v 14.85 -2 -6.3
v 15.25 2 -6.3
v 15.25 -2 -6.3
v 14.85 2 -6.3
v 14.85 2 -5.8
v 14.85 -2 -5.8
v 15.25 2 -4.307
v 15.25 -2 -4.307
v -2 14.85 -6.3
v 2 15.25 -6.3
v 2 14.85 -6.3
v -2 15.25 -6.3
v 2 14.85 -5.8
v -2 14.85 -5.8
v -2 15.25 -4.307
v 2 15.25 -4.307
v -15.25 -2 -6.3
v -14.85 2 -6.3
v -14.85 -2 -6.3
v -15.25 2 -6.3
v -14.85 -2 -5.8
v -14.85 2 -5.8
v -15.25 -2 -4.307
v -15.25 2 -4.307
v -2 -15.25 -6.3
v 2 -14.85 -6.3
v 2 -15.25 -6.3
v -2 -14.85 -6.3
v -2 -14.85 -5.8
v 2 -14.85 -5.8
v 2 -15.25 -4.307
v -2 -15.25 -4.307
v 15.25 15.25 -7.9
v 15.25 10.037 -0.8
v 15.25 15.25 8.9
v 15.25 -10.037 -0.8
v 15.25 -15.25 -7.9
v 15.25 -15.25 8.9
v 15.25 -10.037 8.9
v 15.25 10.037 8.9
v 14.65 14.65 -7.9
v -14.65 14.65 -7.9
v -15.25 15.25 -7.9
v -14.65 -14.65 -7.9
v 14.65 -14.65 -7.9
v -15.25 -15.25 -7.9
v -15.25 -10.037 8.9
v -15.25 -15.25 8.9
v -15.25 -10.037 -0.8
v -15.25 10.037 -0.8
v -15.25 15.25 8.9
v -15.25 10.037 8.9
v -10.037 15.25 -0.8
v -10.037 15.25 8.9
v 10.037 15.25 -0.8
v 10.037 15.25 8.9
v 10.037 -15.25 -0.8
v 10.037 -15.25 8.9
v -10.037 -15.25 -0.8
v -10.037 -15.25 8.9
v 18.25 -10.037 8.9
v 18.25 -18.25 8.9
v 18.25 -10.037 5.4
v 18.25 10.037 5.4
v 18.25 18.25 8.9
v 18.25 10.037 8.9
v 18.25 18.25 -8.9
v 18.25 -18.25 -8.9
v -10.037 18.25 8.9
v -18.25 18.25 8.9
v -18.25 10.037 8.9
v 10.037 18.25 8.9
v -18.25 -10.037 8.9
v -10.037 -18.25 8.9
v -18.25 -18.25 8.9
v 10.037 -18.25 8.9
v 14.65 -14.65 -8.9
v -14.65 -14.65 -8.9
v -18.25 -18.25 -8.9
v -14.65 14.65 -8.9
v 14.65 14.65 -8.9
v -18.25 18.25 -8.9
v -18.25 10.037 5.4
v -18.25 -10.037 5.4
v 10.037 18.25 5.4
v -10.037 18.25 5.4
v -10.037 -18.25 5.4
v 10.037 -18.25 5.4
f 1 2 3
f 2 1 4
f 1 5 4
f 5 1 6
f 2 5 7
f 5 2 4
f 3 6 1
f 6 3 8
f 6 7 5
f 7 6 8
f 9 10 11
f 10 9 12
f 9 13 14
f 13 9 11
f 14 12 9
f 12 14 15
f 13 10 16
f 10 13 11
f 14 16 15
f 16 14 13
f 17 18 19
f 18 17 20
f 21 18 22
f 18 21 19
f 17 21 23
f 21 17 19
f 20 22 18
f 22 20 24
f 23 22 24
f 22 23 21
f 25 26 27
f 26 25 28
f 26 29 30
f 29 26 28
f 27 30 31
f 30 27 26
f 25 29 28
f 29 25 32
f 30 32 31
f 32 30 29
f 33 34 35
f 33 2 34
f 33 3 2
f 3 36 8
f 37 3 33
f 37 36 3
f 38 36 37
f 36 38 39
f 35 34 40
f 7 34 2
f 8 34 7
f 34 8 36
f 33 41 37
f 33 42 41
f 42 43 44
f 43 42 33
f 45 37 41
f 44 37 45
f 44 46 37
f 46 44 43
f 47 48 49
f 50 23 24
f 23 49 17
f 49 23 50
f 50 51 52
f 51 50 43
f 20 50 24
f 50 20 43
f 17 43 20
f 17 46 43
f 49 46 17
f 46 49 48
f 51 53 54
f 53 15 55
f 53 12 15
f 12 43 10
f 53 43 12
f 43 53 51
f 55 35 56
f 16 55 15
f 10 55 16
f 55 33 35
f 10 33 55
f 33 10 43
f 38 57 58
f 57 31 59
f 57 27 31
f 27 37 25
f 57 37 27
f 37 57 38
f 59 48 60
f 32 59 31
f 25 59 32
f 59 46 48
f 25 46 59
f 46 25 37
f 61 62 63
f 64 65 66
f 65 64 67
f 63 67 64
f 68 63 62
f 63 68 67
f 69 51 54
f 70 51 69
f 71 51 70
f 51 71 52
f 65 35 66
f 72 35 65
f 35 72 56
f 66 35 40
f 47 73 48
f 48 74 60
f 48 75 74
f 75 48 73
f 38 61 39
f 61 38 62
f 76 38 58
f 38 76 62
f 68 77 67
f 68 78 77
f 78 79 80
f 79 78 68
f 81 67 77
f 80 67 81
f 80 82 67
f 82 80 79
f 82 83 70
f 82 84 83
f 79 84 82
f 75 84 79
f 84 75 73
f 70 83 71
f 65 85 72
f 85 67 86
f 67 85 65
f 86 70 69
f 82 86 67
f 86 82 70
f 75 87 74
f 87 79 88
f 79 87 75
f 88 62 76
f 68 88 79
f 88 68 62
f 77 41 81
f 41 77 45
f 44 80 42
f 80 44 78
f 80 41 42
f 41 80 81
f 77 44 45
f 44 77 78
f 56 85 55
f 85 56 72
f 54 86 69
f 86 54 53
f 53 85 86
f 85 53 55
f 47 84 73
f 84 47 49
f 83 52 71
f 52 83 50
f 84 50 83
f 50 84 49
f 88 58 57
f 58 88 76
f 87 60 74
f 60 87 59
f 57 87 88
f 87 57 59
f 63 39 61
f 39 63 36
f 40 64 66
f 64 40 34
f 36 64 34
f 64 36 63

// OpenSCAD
deviceFudge=0.5;//mm, fudge factor to account for printing inaccuracy, shrinkage
PCBThickness=1.6; //mm
pinRecepticalTop=5.5;//mm above pcb that the pin receptical extends
pinsHeight=pinRecepticalTop+4.2+2;//mm above pcb, fully extended
maxSubstrateThickness=3;//mm
wallT=3;//mm, wall thickness
PCBShelfW=0.6;//mm, the pcb sits on this
belowPBC=1;//mm extension below PCB
crownFraction=0.55;//fraction of each side length to subtract to make extension corners

capT = 5; //mm cap thickness

solidHeight=pinsHeight;//mm above pcb for solid wall
crownHeight=maxSubstrateThickness+0.5;//mm, corners extension above pin ends
totalHeight=belowPBC+PCBThickness+solidHeight+crownHeight;

module base ( xyDev ) {
    vDeviceDim=xyDev+deviceFudge;
    xyLen=vDeviceDim+wallT*2;
    
    chunk_width = 4;
    chunk_outdent = 0.4;
    chunk_height = 0.5;
    chunk_angle = 75; 
    
    difference(){
        cube([xyLen,xyLen,totalHeight],center = true);
        difference(){
            translate([0,0,belowPBC]) cube([vDeviceDim,vDeviceDim,totalHeight],center = true);
            
            //these parts clip in the PCB
            rotate([0,0,0])   translate([vDeviceDim/2-chunk_outdent,-chunk_width/2,-totalHeight/2+belowPBC+PCBThickness]) {cube([wallT+chunk_outdent,chunk_width,chunk_height],center = false); translate([wallT+chunk_outdent,chunk_width,chunk_height]) rotate([0,0,180]) linear_extrude((wallT+chunk_outdent)*tan(chunk_angle), scale=[0,1]) square([wallT+chunk_outdent,chunk_width]);}
            rotate([0,0,90])  translate([vDeviceDim/2-chunk_outdent,-chunk_width/2,-totalHeight/2+belowPBC+PCBThickness]) {cube([wallT+chunk_outdent,chunk_width,chunk_height],center = false); translate([wallT+chunk_outdent,chunk_width,chunk_height]) rotate([0,0,180]) linear_extrude((wallT+chunk_outdent)*tan(chunk_angle), scale=[0,1]) square([wallT+chunk_outdent,chunk_width]);}
            rotate([0,0,180]) translate([vDeviceDim/2-chunk_outdent,-chunk_width/2,-totalHeight/2+belowPBC+PCBThickness]) {cube([wallT+chunk_outdent,chunk_width,chunk_height],center = false); translate([wallT+chunk_outdent,chunk_width,chunk_height]) rotate([0,0,180]) linear_extrude((wallT+chunk_outdent)*tan(chunk_angle), scale=[0,1]) square([wallT+chunk_outdent,chunk_width]);}
            rotate([0,0,270]) translate([vDeviceDim/2-chunk_outdent,-chunk_width/2,-totalHeight/2+belowPBC+PCBThickness]) {cube([wallT+chunk_outdent,chunk_width,chunk_height],center = false); translate([wallT+chunk_outdent,chunk_width,chunk_height]) rotate([0,0,180]) linear_extrude((wallT+chunk_outdent)*tan(chunk_angle), scale=[0,1]) square([wallT+chunk_outdent,chunk_width]);}
            
        }
        cube([vDeviceDim-2*PCBShelfW,vDeviceDim-2*PCBShelfW,totalHeight+1],center = true);
        
        translate([0,xyLen/2,totalHeight/2+(crownHeight+1)/2-crownHeight]) cube([xyLen*crownFraction,xyLen,crownHeight+1],center = true);
        rotate([0,0,180]) translate([-xyLen*crownFraction/2,-xyLen/2,totalHeight/2-crownHeight]) rotate([0,90,0])  linear_extrude(height=xyLen*crownFraction) polygon([[0,0],[0,wallT],[(pinsHeight-pinRecepticalTop),wallT]]);
        
        rotate([0,0,90]) translate([0,xyLen/2,totalHeight/2+(crownHeight+1)/2-crownHeight]) cube([xyLen*crownFraction,xyLen,crownHeight+1],center = true);
        rotate([0,0,270]) translate([-xyLen*crownFraction/2,-xyLen/2,totalHeight/2-crownHeight]) rotate([0,90,0])  linear_extrude(height=xyLen*crownFraction) polygon([[0,0],[0,wallT],[(pinsHeight-pinRecepticalTop),wallT]]);
        
        rotate([0,0,180]) translate([0,xyLen/2,totalHeight/2+(crownHeight+1)/2-crownHeight]) cube([xyLen*crownFraction,xyLen,crownHeight+1],center = true);
        translate([-xyLen*crownFraction/2,-xyLen/2,totalHeight/2-crownHeight]) rotate([0,90,0])  linear_extrude(height=xyLen*crownFraction) polygon([[0,0],[0,wallT],[(pinsHeight-pinRecepticalTop),wallT]]);
        
        rotate([0,0,270]) translate([0,xyLen/2,totalHeight/2+(crownHeight+1)/2-crownHeight]) cube([xyLen*crownFraction,xyLen,crownHeight+1],center = true);
        rotate([0,0,90]) translate([-xyLen*crownFraction/2,-xyLen/2,totalHeight/2-crownHeight]) rotate([0,90,0])  linear_extrude(height=xyLen*crownFraction) polygon([[0,0],[0,wallT],[(pinsHeight-pinRecepticalTop),wallT]]);
    }
}
base(30);
